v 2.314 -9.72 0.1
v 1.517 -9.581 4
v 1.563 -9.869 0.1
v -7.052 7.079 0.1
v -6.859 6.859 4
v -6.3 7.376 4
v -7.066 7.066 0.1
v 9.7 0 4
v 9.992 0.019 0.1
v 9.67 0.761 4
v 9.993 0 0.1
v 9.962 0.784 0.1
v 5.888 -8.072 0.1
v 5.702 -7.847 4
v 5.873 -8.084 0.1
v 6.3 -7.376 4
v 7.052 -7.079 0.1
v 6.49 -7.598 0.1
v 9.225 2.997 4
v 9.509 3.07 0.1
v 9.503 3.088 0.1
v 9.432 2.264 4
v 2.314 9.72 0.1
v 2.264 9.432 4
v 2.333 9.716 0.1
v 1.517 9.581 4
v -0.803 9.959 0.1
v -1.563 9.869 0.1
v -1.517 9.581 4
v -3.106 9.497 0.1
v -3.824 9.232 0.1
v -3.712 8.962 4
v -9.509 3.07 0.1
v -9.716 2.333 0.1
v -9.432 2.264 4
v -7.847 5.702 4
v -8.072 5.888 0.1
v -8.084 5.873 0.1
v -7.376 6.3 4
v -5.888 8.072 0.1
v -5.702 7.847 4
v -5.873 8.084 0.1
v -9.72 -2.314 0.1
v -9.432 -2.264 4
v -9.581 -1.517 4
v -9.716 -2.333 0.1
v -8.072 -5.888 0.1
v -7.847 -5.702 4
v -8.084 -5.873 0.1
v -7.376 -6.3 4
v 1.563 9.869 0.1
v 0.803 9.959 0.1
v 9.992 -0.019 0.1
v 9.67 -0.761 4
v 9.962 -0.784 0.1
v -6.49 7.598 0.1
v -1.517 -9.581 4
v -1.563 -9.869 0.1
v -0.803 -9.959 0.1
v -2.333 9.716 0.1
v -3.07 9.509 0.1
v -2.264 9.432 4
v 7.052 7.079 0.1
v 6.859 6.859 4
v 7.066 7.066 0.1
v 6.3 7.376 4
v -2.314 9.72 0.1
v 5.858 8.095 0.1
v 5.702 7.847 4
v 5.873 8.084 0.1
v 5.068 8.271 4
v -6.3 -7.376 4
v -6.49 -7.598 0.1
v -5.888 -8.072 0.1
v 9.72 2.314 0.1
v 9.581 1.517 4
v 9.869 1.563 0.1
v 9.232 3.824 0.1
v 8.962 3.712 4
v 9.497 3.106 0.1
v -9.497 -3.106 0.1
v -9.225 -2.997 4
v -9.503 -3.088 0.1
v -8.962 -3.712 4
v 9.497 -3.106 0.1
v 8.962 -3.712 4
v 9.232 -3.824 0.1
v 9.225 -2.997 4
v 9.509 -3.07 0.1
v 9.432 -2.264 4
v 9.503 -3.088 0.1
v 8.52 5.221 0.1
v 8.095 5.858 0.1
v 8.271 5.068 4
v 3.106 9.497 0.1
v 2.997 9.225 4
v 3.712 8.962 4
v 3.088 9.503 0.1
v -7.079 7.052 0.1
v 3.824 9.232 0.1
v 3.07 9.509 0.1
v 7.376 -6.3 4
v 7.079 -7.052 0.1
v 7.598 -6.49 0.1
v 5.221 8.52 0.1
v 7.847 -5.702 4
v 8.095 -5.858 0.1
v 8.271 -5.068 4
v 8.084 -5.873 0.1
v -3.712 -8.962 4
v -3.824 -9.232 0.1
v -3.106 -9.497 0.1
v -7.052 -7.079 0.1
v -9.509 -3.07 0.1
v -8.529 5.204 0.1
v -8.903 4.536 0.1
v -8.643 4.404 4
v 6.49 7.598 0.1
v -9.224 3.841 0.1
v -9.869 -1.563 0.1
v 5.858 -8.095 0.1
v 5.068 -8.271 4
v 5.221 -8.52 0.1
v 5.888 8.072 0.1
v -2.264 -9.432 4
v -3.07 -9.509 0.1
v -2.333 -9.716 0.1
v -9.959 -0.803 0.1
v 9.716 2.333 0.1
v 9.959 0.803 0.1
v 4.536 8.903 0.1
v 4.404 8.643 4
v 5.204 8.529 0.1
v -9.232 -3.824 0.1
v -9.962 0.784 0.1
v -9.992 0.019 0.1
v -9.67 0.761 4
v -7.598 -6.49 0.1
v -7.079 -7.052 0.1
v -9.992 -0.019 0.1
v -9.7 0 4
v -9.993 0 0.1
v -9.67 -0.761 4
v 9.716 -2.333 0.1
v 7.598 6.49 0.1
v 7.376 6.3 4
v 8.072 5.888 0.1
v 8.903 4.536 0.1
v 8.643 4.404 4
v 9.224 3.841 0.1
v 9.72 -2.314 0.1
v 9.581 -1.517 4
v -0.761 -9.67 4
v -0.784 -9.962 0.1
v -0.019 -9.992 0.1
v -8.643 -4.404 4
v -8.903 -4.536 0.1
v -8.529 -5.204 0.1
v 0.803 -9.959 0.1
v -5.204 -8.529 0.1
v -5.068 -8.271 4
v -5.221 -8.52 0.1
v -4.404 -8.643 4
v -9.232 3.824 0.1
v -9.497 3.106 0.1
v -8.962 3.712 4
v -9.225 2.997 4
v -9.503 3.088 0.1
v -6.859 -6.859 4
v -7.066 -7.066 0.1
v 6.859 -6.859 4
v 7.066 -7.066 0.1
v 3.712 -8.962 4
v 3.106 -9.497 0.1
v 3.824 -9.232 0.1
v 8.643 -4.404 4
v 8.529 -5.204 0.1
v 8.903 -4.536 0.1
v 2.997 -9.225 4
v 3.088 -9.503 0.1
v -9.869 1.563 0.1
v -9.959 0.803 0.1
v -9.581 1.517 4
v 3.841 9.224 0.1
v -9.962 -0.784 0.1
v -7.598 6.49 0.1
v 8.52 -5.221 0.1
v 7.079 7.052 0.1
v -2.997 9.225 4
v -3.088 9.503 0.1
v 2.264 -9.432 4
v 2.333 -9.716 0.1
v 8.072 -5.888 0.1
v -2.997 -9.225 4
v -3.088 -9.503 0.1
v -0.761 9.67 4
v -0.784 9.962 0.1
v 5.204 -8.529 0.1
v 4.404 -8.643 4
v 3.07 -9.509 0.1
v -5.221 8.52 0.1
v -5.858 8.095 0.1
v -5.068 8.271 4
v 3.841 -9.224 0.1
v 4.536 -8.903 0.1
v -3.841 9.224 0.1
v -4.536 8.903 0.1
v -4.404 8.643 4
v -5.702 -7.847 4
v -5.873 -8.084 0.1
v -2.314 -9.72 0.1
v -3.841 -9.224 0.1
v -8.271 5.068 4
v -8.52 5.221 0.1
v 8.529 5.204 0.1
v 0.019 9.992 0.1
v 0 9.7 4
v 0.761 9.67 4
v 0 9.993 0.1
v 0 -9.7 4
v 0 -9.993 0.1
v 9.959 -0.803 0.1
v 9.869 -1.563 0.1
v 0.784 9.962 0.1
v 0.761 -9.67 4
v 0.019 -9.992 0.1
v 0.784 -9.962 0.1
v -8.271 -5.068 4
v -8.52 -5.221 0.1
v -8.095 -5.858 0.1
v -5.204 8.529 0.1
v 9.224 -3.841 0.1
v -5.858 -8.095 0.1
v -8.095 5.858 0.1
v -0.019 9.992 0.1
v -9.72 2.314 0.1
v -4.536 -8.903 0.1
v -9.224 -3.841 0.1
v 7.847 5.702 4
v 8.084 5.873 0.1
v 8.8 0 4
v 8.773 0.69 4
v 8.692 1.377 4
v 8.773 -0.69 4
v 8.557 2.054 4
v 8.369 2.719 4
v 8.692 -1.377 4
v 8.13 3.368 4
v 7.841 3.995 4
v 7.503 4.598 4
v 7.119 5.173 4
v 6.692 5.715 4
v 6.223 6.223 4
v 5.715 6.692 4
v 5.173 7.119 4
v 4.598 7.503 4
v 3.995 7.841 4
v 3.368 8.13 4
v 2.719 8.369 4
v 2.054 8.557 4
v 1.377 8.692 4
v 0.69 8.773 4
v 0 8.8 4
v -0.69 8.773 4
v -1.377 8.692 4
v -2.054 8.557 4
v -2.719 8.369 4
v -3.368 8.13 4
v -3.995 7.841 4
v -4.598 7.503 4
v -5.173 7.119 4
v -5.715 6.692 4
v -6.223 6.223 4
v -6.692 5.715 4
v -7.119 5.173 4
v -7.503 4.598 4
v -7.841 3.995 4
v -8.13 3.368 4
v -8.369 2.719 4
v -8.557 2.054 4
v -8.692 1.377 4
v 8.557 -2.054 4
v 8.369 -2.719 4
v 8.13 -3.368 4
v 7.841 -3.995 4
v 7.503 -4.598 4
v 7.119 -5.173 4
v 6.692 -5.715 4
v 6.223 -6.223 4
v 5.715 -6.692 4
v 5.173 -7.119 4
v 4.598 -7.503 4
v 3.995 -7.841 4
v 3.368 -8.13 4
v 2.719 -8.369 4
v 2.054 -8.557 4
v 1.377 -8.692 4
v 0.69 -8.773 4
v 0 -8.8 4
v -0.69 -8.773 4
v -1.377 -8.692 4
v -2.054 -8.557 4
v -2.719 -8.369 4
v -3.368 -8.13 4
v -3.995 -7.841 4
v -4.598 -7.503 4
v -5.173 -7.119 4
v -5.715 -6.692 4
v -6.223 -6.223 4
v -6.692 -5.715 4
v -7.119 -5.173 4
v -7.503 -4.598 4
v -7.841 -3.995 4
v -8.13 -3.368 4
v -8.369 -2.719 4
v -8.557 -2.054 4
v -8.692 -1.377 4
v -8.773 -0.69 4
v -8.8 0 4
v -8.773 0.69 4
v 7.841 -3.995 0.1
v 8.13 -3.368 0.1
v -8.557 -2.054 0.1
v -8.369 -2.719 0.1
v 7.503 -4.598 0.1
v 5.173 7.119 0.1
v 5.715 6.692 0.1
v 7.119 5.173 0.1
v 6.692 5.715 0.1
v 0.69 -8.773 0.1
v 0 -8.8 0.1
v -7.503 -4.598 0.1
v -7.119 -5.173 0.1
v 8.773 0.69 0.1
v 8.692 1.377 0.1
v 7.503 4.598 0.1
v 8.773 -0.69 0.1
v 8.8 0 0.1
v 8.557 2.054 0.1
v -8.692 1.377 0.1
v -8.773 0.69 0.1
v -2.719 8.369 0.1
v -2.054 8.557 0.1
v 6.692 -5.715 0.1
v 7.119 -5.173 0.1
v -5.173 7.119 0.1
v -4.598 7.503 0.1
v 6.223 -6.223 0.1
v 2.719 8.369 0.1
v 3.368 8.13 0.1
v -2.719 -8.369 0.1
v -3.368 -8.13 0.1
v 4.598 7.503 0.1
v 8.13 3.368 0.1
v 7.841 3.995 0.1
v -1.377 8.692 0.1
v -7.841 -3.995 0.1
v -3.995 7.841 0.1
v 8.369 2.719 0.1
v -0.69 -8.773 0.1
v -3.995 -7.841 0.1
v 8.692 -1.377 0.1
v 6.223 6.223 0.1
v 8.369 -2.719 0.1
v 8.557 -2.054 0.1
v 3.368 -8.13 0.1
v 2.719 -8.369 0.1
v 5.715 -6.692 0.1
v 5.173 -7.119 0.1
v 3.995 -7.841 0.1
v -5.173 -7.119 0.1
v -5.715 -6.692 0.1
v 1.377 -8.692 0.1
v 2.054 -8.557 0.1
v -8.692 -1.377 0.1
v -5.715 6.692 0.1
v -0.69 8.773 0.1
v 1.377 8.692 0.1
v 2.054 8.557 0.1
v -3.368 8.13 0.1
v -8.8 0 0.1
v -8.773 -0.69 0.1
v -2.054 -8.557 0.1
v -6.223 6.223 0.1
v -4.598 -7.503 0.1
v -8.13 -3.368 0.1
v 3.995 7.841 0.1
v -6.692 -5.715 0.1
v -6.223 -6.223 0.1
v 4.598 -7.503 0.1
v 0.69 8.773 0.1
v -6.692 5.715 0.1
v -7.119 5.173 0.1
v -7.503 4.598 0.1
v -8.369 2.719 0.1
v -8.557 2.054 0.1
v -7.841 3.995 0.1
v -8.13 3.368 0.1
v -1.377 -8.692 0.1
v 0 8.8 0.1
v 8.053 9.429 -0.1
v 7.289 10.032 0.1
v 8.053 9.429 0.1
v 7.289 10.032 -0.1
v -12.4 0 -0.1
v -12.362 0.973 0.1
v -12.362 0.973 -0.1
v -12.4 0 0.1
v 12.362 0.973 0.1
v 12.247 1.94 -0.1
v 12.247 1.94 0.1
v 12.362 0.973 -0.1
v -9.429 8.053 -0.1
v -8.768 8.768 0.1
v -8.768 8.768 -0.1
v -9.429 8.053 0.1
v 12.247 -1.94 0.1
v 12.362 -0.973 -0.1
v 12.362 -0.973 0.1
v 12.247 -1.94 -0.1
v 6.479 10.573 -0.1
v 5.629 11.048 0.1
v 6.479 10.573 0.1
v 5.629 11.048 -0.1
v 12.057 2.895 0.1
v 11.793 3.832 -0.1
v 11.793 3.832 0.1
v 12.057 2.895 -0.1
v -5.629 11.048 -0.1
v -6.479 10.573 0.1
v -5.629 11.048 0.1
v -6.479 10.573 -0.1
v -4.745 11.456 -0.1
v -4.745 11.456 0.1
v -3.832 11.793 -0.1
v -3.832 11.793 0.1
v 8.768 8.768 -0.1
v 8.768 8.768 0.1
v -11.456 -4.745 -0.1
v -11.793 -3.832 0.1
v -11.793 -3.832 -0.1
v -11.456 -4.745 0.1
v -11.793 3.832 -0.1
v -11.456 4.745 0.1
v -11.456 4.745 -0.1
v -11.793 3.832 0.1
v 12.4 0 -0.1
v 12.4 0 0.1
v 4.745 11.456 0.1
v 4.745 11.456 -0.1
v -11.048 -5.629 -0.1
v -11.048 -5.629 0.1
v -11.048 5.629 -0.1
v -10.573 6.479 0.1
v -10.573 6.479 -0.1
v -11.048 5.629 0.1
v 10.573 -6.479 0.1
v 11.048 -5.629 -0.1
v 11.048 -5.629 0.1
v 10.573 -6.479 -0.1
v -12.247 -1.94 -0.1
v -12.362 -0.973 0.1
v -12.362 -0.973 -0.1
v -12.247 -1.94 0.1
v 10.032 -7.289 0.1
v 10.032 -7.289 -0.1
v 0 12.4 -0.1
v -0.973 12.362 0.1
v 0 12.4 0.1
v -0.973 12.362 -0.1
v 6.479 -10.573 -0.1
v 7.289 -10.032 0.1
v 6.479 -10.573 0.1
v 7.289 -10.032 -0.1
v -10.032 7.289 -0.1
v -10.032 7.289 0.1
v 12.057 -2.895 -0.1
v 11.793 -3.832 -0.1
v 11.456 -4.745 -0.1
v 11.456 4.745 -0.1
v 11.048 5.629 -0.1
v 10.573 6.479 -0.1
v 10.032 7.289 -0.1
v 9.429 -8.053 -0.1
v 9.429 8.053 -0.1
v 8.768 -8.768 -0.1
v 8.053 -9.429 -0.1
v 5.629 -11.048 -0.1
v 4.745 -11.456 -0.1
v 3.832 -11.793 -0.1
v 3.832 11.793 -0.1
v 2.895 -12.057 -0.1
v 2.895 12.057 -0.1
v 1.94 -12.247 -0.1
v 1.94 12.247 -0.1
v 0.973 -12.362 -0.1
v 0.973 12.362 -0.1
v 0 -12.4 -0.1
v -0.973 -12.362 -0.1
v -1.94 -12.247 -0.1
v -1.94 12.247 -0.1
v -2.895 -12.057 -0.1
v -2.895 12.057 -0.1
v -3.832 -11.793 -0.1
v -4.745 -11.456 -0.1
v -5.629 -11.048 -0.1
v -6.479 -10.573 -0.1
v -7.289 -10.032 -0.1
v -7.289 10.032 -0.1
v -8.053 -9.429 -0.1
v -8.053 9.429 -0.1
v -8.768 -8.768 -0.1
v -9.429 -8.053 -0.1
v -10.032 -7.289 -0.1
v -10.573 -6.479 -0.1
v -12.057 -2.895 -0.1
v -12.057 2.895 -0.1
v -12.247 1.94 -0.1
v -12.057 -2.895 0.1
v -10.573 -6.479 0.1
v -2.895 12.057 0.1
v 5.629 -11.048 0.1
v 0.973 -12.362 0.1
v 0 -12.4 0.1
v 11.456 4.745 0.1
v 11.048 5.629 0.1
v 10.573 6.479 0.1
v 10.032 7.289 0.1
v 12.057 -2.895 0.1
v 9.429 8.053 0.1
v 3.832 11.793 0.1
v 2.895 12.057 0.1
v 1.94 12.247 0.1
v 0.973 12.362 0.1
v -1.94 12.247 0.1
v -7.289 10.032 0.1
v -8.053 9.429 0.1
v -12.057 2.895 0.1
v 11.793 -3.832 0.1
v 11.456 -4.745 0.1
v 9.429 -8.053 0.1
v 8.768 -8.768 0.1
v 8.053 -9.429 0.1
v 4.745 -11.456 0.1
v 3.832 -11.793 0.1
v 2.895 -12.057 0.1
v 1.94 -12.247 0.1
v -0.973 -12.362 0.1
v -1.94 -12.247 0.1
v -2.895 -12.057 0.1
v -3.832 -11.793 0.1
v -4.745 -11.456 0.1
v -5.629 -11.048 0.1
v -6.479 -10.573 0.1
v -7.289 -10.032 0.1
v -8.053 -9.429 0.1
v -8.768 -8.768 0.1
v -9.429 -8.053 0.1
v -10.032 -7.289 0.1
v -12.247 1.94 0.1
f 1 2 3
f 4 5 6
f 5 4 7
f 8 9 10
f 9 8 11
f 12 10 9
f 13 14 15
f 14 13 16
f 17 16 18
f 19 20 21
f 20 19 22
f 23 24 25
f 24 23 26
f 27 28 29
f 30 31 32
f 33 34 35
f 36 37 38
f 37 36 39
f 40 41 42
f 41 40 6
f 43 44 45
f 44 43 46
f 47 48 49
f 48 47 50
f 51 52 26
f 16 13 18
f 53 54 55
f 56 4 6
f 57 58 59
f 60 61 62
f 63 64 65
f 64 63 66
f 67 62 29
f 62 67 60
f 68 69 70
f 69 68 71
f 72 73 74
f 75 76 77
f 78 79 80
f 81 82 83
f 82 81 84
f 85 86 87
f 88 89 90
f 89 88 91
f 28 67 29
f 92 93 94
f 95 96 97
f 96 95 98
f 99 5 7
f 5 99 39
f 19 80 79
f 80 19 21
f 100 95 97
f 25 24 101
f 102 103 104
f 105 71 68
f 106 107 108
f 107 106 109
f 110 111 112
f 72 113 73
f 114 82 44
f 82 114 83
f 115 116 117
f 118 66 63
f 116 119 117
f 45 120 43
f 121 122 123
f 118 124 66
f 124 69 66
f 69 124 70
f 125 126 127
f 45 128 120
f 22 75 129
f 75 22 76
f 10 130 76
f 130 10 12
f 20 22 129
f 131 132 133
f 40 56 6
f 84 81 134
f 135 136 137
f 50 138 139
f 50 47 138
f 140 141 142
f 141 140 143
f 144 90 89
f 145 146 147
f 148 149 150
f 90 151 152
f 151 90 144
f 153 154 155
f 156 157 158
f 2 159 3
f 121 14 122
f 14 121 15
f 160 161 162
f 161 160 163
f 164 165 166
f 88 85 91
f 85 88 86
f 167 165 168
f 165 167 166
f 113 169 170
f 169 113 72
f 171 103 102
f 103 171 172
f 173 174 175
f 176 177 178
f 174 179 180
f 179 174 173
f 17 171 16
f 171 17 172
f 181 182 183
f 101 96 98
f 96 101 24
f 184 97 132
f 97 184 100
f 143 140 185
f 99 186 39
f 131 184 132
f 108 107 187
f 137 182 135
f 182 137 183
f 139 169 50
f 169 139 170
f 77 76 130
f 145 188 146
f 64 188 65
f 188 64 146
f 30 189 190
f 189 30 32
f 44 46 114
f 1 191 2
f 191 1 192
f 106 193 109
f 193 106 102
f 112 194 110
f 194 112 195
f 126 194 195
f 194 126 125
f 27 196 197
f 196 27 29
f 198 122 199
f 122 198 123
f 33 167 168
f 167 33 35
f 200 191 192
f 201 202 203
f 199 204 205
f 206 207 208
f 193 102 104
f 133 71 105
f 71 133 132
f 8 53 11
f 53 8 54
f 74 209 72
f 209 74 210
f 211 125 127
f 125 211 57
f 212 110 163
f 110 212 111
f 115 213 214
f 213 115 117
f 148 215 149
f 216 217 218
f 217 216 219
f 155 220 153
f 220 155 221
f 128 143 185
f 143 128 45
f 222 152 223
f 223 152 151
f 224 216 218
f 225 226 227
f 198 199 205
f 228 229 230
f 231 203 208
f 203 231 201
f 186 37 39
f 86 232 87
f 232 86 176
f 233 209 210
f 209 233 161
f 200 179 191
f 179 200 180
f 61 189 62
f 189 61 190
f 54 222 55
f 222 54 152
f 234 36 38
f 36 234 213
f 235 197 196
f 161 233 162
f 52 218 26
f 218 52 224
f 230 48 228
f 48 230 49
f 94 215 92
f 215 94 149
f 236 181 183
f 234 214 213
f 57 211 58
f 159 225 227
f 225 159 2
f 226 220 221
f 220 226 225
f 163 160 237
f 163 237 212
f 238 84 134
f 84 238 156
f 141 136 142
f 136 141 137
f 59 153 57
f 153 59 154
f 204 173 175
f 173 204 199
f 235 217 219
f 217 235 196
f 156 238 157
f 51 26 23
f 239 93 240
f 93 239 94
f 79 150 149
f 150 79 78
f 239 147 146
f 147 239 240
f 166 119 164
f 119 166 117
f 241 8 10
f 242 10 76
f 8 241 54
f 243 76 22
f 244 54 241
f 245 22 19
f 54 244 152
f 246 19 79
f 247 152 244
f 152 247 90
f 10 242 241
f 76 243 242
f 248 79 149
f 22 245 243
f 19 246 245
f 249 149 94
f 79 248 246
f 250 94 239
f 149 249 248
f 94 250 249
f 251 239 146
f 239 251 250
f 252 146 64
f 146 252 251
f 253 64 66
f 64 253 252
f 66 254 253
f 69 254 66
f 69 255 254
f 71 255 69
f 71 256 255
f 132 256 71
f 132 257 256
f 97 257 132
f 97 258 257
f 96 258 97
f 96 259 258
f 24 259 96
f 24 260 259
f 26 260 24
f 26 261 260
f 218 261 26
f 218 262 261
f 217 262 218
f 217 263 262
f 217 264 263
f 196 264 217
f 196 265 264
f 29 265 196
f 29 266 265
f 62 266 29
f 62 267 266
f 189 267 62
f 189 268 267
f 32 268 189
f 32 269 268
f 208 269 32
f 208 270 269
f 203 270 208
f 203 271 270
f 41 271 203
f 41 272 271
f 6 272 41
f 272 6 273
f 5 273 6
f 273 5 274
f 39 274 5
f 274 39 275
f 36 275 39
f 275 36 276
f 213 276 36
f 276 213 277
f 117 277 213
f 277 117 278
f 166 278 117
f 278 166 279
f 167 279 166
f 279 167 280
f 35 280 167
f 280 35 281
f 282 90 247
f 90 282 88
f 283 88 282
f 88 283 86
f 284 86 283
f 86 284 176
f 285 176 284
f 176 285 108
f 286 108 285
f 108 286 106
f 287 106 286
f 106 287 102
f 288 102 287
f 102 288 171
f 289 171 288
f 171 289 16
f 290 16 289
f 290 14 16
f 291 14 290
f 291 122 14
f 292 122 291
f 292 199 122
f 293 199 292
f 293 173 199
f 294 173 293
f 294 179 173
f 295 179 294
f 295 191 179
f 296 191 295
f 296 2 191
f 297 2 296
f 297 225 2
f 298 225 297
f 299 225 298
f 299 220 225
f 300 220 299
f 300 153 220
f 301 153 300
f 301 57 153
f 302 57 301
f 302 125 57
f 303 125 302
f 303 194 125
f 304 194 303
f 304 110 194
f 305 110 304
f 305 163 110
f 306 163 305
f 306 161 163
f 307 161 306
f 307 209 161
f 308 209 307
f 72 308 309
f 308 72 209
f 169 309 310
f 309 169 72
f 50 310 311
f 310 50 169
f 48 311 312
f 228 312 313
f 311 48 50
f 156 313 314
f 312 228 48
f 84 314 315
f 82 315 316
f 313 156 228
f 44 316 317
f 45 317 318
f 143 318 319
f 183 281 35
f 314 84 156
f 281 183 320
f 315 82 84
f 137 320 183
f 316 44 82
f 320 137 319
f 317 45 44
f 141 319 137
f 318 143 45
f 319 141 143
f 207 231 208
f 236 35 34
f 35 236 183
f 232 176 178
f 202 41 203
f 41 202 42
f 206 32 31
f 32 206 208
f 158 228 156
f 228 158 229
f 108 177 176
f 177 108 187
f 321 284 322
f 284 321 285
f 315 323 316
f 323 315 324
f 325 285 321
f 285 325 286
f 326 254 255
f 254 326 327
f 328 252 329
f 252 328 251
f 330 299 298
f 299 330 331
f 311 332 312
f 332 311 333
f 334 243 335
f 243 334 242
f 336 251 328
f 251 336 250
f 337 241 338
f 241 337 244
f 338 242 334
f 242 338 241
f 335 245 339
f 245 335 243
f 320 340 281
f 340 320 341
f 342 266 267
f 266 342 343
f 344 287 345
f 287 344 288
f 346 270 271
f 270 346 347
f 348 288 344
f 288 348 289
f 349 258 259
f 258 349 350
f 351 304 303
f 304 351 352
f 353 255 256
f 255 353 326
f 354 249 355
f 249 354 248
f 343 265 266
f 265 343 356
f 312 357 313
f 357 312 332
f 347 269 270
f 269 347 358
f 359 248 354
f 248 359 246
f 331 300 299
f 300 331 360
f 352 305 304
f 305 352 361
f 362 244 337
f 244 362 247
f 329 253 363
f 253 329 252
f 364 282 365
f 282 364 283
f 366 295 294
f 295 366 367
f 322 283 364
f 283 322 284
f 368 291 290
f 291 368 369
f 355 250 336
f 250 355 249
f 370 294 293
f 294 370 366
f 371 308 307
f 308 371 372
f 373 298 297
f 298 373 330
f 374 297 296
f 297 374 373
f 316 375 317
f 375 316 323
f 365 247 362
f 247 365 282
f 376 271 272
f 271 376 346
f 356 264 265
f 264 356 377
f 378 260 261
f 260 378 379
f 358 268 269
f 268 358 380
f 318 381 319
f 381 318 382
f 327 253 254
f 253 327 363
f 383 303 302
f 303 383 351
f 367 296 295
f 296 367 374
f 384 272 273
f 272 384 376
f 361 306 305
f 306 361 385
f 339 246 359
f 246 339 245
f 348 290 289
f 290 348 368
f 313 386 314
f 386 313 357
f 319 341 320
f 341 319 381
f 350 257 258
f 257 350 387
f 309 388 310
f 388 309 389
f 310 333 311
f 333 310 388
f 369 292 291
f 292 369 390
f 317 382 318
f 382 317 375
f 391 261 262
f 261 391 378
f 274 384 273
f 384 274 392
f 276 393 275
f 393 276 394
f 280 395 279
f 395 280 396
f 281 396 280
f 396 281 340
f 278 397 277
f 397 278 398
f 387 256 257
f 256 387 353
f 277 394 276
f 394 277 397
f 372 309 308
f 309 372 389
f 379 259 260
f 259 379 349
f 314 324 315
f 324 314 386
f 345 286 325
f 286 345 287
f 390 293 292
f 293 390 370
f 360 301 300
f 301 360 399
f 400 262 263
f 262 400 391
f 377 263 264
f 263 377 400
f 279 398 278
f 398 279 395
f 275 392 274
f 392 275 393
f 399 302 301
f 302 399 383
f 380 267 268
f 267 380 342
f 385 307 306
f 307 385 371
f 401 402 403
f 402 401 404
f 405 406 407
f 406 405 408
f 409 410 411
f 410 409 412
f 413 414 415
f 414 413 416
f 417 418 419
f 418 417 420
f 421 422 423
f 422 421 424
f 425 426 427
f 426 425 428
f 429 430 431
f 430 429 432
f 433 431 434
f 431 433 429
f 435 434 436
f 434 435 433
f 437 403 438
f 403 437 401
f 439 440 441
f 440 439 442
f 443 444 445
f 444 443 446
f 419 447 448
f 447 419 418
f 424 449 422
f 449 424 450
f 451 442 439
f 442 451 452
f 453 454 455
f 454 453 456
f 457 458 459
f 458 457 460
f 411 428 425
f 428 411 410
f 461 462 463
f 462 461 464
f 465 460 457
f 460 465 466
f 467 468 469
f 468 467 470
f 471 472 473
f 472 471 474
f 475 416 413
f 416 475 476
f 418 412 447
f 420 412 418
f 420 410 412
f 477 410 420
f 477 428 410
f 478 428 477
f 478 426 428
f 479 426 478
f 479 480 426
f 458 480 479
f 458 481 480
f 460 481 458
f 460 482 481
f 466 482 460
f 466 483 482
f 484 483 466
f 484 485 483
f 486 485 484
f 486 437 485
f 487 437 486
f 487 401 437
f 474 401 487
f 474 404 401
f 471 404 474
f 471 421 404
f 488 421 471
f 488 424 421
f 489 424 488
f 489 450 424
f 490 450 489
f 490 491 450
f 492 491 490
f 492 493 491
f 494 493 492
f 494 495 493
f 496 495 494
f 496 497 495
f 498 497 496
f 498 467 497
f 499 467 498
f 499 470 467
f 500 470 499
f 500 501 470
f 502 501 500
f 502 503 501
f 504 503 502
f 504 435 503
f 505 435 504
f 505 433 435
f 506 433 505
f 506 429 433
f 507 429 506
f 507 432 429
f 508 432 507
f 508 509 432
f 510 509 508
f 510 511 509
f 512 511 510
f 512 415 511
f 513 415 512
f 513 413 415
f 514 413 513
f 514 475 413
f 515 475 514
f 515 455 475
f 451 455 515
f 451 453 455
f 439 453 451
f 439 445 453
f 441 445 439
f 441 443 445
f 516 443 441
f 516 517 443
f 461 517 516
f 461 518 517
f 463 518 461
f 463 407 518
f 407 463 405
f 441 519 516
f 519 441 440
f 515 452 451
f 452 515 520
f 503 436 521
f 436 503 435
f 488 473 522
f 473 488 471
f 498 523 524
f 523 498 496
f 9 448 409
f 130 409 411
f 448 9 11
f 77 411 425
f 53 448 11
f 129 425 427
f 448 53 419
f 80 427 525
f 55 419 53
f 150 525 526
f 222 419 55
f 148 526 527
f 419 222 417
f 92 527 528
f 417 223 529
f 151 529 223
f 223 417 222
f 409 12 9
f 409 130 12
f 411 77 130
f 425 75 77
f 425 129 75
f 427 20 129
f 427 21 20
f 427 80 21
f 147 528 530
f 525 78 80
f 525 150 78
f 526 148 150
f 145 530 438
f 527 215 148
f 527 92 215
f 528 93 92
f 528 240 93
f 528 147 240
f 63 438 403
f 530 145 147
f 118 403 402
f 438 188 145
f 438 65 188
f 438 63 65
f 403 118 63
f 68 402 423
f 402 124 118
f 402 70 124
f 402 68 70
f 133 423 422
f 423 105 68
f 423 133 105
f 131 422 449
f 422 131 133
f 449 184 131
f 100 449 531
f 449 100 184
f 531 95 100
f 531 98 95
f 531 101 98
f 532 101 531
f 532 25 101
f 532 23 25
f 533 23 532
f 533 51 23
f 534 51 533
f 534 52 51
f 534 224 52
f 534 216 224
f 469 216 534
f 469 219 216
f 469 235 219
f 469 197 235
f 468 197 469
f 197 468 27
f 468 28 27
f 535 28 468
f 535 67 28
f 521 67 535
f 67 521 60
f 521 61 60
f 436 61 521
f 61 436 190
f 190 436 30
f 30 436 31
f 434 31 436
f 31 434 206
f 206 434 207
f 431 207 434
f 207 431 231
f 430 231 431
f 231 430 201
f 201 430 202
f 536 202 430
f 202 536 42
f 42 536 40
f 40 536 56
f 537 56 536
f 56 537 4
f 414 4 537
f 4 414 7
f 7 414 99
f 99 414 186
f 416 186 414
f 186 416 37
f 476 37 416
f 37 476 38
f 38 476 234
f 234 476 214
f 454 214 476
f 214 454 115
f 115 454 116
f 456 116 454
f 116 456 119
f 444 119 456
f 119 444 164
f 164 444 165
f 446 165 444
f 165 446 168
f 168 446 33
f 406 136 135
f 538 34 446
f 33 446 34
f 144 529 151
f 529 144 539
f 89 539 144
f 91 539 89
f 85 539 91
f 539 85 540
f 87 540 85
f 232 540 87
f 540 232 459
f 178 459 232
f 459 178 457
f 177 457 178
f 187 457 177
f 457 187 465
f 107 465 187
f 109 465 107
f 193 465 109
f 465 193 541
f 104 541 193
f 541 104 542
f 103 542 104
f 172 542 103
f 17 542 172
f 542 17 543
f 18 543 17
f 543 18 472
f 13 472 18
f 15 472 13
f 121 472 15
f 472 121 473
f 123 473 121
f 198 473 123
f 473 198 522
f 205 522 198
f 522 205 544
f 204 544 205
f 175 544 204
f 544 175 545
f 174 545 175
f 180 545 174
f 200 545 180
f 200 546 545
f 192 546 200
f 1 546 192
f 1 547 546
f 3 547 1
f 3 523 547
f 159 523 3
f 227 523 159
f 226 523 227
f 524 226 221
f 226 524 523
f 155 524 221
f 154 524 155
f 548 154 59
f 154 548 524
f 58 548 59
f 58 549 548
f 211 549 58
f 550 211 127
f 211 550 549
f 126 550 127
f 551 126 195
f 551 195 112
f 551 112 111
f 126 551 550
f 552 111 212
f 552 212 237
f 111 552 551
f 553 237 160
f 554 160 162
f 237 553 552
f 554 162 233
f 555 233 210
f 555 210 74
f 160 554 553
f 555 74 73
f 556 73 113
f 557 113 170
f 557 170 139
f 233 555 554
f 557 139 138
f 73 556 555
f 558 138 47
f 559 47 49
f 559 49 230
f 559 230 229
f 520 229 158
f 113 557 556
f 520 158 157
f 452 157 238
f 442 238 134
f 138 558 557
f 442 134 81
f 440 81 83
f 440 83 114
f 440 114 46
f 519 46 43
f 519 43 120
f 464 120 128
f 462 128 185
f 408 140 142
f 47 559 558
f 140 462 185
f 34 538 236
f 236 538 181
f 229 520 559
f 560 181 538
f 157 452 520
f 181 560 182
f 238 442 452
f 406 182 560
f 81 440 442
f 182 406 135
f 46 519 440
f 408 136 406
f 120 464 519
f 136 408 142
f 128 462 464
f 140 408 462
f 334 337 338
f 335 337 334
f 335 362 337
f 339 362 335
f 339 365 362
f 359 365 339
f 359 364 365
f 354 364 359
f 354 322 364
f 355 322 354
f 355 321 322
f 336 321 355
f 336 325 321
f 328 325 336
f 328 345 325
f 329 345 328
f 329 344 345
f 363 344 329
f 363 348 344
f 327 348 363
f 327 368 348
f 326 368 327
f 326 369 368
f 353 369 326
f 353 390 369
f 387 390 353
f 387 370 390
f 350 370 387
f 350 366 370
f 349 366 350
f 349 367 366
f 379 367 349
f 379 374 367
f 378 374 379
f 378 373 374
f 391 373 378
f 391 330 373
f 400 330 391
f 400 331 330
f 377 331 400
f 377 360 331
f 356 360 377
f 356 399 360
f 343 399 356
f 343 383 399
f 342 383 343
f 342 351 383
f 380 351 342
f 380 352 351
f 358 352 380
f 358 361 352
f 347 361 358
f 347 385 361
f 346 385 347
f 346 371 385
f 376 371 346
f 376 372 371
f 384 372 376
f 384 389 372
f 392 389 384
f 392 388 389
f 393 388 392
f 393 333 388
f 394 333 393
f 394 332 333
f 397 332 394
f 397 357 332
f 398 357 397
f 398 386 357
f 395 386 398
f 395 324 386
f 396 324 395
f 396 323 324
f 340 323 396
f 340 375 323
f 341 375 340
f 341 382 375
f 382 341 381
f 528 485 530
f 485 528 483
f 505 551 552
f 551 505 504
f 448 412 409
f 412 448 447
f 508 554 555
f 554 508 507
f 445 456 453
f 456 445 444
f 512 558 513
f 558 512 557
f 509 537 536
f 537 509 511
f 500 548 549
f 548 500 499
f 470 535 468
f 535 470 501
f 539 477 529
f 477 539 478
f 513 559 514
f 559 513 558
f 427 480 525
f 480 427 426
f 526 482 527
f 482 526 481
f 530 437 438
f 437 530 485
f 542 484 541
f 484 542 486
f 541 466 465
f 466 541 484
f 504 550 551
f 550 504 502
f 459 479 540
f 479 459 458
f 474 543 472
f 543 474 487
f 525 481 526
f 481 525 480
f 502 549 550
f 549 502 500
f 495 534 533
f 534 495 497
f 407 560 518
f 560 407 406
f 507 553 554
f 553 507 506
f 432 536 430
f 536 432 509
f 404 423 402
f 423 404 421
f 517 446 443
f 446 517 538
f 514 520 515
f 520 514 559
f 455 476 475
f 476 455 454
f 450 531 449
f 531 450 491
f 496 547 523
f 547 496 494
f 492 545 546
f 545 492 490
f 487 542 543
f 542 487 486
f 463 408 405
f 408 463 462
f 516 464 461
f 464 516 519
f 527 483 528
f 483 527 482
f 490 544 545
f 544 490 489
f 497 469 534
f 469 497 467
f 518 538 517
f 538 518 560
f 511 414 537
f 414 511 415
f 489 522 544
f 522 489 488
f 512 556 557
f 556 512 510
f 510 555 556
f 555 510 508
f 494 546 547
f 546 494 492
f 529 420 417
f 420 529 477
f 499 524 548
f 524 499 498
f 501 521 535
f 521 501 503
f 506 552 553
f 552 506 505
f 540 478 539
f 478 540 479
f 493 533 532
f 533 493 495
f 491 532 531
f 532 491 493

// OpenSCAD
$fn=80;
hole_d=20;
h=4;
cap_th=0.2;
wall_th=1.2;

translate([0,0,-cap_th/2])
cylinder(d=hole_d+4*wall_th, h=cap_th);

difference(){
    cylinder(d1=hole_d, d2=hole_d-wall_th/2, h=h);

    translate([0,0,-1])
    cylinder(d=hole_d-2*wall_th, h=2*h);
}
